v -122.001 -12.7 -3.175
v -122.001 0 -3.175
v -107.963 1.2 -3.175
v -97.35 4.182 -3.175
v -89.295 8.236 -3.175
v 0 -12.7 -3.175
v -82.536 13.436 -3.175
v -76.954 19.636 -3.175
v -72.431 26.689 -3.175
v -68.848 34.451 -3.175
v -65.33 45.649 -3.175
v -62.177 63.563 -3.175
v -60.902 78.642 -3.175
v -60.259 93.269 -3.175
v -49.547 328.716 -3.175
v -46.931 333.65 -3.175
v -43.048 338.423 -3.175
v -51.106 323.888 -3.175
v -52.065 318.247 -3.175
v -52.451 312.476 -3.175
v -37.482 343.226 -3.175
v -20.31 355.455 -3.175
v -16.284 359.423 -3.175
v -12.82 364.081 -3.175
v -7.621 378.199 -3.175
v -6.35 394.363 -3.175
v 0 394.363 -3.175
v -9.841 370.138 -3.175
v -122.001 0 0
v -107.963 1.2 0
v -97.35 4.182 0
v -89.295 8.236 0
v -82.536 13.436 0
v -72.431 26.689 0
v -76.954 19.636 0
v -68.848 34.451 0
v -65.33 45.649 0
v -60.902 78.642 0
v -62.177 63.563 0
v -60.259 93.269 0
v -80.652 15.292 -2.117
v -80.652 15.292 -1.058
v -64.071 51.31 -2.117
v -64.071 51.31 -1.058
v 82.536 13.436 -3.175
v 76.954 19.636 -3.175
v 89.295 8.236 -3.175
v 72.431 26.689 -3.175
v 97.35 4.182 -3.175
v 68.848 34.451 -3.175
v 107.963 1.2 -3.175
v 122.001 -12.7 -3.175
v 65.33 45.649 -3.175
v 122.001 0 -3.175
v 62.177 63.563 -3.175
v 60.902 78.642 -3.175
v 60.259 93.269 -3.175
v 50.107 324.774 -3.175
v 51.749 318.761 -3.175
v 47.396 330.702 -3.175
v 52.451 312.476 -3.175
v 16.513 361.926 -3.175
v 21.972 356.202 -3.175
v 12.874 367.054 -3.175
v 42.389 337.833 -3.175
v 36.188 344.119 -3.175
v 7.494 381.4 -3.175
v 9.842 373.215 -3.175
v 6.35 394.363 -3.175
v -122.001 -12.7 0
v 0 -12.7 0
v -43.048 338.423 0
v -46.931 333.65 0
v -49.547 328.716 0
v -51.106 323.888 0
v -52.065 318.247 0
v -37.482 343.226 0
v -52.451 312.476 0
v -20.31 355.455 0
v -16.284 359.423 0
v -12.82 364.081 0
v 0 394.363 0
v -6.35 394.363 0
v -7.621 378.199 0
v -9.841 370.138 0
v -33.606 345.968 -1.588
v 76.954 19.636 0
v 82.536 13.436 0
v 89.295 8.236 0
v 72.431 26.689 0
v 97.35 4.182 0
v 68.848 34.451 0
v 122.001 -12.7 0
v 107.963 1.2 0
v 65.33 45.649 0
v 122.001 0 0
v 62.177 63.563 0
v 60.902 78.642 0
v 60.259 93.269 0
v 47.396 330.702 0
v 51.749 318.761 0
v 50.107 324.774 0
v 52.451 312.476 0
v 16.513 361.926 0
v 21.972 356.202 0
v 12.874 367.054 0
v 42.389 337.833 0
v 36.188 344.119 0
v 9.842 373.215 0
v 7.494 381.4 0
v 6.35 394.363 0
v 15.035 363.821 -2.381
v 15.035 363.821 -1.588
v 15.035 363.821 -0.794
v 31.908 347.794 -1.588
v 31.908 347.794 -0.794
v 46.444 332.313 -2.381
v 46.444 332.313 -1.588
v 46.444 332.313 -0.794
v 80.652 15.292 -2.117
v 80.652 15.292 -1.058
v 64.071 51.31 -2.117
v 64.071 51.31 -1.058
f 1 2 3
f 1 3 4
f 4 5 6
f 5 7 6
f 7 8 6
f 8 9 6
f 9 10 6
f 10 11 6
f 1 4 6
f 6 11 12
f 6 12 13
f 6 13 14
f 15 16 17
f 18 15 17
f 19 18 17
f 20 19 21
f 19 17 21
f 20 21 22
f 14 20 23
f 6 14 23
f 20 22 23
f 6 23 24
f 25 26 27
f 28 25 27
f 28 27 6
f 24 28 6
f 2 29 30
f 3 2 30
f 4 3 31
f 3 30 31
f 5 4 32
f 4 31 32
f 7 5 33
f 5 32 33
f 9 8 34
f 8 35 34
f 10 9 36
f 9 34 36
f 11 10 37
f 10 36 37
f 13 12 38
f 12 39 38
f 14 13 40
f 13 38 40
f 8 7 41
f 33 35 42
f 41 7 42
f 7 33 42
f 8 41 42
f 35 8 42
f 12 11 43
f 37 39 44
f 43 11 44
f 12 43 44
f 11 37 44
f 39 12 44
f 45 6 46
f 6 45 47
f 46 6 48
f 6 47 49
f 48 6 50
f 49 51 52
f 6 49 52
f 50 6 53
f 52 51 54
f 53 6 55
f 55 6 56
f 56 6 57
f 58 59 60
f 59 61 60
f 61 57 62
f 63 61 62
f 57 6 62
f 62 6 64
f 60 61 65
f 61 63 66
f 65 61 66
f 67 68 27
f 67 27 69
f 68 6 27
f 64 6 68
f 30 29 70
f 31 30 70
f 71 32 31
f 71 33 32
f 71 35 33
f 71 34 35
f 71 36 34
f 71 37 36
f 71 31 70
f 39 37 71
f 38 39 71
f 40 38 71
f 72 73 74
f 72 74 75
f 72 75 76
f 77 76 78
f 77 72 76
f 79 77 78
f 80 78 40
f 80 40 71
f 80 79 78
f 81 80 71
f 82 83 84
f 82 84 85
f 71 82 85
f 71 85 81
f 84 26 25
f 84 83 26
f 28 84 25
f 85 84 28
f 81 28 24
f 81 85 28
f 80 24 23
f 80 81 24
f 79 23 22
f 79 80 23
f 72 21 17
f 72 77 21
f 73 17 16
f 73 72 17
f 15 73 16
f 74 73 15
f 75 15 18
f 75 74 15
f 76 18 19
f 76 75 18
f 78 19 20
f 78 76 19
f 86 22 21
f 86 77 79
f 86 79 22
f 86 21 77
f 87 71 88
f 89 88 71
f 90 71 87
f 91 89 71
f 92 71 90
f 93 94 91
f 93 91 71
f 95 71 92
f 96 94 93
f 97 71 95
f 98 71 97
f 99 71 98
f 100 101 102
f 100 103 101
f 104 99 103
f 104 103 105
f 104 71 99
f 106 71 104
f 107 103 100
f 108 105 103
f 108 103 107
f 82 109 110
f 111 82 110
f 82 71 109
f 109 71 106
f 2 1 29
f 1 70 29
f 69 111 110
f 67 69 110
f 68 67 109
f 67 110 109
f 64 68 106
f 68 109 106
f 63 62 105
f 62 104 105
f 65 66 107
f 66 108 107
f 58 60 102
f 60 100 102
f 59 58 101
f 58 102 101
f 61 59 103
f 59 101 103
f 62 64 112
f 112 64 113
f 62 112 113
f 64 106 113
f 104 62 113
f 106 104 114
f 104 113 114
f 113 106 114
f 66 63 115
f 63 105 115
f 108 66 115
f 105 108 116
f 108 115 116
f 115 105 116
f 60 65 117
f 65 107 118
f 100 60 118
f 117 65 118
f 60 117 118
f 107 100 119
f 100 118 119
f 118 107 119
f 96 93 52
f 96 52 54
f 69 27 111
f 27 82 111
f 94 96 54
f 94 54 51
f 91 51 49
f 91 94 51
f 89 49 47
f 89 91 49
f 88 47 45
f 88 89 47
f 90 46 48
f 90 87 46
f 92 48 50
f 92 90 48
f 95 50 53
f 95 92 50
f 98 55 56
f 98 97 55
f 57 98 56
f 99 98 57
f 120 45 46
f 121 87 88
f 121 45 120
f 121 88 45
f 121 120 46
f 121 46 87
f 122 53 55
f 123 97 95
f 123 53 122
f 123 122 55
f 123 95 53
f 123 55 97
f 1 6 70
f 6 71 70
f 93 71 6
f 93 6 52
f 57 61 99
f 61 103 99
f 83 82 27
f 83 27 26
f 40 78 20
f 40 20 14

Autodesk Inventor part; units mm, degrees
ref_plane "YZ Plane" through (0, 0, 0) normal (1, 0, 0) x (0, 1, 0)
ref_plane "XZ Plane" through (0, 0, 0) normal (0, 1, 0) x (-1, 0, 0)
ref_plane "XY Plane" through (0, 0, 0) normal (0, 0, 1) x (1, 0, 0)
sketch "Sketch1" plane through (0, 0, 0) normal (0, 0, 1) x (1, 0, 0)
  line L0 (76.2, -12.7) -> (381, -12.7) construction
  line L1 (-76.2, -12.7) -> (-381, -12.7) construction
  line L2 (-76.2, 0) -> (-381, 0) construction
  line L3 (76.2, 0) -> (381, 0) construction
  line L4 (0, -116.2267) -> (0, 608.4603)
  line L5 (0, -12.7) -> (-122.0009, -12.7)
  line L6 (-122.0009, -12.7) -> (-122.0009, 0)
  line L7 (0, 394.3626) -> (-6.35, 394.3626)
  line L8 (-52.4512, 312.4765) -> (-60.2591, 93.2692)
  spline S0 degree 3 poles (-122.0009, 0) (-64.2705, 0) (-61.6839, 53.2691) (-60.2591, 93.2692) knots 0 0 0 0 1 1 1 1
  line L9 (-127.2981, 0) -> (-116.7037, 0) construction
  arc A0 (-126.2344, 0.0955) -> (-117.7675, 0.0955) centre (-122.0009, 93.8482) ccw construction
  line L10 (52.4512, 312.4765) -> (60.2591, 93.2692)
  line L11 (0, 394.3626) -> (6.35, 394.3626)
  spline S1 degree 3 poles (122.0009, 0) (64.2705, 0) (61.6839, 53.2691) (60.2591, 93.2692) knots 0 0 0 0 1 1 1 1
  line L12 (127.2981, 0) -> (116.7037, 0) construction
  arc A1 (117.7675, 0.0955) -> (126.2344, 0.0955) centre (122.0009, 93.8482) ccw construction
  line L13 (0, -12.7) -> (122.0009, -12.7)
  line L14 (122.0009, -12.7) -> (122.0009, 0)
  spline S2 degree 4 poles (-6.35, 394.3626) (-6.35, 370.6692) (-16.2148, 349.4175) (-49.2512, 345.2253) (-52.0931, 322.5296) (-52.4512, 312.4765) knots 0 0 0 0 0 0.529809 1 1 1 1 1
  line L15 (-6.35, 421.2444) -> (-6.35, 367.4808) construction
  arc A2 (-7.9378, 373.0956) -> (-7.9378, 415.6296) centre (-149.5647, 394.3626) ccw construction
  spline S3 degree 4 poles (6.35, 394.3626) (6.35, 349.6419) (36.5958, 353.9783) (51.6896, 333.8574) (52.4512, 312.4765) knots 0 0 0 0 0 1 1 1 1 1
  line L16 (6.35, 421.2444) -> (6.35, 367.4808) construction
  arc A3 (7.9378, 415.6296) -> (7.9378, 373.0956) centre (149.5647, 394.3626) ccw construction
  line L17 (-23.1287, 353.4652) -> (-48.6526, 335.307) construction
  arc A4 (-25.2872, 350.8986) -> (-45.5201, 336.5045) centre (17.5347, 269.2893) ccw construction
  point P0 (0, 0)
  point P1 (-35.8906, 344.3861)
  point P2 (35.8906, 344.3861)
  dimension "d0" = 6.35
extrude "Extrusion1" add sketch "Sketch1" against normal blind 3.175
properties part number "Plate" material "High Impact Polystyrene"
